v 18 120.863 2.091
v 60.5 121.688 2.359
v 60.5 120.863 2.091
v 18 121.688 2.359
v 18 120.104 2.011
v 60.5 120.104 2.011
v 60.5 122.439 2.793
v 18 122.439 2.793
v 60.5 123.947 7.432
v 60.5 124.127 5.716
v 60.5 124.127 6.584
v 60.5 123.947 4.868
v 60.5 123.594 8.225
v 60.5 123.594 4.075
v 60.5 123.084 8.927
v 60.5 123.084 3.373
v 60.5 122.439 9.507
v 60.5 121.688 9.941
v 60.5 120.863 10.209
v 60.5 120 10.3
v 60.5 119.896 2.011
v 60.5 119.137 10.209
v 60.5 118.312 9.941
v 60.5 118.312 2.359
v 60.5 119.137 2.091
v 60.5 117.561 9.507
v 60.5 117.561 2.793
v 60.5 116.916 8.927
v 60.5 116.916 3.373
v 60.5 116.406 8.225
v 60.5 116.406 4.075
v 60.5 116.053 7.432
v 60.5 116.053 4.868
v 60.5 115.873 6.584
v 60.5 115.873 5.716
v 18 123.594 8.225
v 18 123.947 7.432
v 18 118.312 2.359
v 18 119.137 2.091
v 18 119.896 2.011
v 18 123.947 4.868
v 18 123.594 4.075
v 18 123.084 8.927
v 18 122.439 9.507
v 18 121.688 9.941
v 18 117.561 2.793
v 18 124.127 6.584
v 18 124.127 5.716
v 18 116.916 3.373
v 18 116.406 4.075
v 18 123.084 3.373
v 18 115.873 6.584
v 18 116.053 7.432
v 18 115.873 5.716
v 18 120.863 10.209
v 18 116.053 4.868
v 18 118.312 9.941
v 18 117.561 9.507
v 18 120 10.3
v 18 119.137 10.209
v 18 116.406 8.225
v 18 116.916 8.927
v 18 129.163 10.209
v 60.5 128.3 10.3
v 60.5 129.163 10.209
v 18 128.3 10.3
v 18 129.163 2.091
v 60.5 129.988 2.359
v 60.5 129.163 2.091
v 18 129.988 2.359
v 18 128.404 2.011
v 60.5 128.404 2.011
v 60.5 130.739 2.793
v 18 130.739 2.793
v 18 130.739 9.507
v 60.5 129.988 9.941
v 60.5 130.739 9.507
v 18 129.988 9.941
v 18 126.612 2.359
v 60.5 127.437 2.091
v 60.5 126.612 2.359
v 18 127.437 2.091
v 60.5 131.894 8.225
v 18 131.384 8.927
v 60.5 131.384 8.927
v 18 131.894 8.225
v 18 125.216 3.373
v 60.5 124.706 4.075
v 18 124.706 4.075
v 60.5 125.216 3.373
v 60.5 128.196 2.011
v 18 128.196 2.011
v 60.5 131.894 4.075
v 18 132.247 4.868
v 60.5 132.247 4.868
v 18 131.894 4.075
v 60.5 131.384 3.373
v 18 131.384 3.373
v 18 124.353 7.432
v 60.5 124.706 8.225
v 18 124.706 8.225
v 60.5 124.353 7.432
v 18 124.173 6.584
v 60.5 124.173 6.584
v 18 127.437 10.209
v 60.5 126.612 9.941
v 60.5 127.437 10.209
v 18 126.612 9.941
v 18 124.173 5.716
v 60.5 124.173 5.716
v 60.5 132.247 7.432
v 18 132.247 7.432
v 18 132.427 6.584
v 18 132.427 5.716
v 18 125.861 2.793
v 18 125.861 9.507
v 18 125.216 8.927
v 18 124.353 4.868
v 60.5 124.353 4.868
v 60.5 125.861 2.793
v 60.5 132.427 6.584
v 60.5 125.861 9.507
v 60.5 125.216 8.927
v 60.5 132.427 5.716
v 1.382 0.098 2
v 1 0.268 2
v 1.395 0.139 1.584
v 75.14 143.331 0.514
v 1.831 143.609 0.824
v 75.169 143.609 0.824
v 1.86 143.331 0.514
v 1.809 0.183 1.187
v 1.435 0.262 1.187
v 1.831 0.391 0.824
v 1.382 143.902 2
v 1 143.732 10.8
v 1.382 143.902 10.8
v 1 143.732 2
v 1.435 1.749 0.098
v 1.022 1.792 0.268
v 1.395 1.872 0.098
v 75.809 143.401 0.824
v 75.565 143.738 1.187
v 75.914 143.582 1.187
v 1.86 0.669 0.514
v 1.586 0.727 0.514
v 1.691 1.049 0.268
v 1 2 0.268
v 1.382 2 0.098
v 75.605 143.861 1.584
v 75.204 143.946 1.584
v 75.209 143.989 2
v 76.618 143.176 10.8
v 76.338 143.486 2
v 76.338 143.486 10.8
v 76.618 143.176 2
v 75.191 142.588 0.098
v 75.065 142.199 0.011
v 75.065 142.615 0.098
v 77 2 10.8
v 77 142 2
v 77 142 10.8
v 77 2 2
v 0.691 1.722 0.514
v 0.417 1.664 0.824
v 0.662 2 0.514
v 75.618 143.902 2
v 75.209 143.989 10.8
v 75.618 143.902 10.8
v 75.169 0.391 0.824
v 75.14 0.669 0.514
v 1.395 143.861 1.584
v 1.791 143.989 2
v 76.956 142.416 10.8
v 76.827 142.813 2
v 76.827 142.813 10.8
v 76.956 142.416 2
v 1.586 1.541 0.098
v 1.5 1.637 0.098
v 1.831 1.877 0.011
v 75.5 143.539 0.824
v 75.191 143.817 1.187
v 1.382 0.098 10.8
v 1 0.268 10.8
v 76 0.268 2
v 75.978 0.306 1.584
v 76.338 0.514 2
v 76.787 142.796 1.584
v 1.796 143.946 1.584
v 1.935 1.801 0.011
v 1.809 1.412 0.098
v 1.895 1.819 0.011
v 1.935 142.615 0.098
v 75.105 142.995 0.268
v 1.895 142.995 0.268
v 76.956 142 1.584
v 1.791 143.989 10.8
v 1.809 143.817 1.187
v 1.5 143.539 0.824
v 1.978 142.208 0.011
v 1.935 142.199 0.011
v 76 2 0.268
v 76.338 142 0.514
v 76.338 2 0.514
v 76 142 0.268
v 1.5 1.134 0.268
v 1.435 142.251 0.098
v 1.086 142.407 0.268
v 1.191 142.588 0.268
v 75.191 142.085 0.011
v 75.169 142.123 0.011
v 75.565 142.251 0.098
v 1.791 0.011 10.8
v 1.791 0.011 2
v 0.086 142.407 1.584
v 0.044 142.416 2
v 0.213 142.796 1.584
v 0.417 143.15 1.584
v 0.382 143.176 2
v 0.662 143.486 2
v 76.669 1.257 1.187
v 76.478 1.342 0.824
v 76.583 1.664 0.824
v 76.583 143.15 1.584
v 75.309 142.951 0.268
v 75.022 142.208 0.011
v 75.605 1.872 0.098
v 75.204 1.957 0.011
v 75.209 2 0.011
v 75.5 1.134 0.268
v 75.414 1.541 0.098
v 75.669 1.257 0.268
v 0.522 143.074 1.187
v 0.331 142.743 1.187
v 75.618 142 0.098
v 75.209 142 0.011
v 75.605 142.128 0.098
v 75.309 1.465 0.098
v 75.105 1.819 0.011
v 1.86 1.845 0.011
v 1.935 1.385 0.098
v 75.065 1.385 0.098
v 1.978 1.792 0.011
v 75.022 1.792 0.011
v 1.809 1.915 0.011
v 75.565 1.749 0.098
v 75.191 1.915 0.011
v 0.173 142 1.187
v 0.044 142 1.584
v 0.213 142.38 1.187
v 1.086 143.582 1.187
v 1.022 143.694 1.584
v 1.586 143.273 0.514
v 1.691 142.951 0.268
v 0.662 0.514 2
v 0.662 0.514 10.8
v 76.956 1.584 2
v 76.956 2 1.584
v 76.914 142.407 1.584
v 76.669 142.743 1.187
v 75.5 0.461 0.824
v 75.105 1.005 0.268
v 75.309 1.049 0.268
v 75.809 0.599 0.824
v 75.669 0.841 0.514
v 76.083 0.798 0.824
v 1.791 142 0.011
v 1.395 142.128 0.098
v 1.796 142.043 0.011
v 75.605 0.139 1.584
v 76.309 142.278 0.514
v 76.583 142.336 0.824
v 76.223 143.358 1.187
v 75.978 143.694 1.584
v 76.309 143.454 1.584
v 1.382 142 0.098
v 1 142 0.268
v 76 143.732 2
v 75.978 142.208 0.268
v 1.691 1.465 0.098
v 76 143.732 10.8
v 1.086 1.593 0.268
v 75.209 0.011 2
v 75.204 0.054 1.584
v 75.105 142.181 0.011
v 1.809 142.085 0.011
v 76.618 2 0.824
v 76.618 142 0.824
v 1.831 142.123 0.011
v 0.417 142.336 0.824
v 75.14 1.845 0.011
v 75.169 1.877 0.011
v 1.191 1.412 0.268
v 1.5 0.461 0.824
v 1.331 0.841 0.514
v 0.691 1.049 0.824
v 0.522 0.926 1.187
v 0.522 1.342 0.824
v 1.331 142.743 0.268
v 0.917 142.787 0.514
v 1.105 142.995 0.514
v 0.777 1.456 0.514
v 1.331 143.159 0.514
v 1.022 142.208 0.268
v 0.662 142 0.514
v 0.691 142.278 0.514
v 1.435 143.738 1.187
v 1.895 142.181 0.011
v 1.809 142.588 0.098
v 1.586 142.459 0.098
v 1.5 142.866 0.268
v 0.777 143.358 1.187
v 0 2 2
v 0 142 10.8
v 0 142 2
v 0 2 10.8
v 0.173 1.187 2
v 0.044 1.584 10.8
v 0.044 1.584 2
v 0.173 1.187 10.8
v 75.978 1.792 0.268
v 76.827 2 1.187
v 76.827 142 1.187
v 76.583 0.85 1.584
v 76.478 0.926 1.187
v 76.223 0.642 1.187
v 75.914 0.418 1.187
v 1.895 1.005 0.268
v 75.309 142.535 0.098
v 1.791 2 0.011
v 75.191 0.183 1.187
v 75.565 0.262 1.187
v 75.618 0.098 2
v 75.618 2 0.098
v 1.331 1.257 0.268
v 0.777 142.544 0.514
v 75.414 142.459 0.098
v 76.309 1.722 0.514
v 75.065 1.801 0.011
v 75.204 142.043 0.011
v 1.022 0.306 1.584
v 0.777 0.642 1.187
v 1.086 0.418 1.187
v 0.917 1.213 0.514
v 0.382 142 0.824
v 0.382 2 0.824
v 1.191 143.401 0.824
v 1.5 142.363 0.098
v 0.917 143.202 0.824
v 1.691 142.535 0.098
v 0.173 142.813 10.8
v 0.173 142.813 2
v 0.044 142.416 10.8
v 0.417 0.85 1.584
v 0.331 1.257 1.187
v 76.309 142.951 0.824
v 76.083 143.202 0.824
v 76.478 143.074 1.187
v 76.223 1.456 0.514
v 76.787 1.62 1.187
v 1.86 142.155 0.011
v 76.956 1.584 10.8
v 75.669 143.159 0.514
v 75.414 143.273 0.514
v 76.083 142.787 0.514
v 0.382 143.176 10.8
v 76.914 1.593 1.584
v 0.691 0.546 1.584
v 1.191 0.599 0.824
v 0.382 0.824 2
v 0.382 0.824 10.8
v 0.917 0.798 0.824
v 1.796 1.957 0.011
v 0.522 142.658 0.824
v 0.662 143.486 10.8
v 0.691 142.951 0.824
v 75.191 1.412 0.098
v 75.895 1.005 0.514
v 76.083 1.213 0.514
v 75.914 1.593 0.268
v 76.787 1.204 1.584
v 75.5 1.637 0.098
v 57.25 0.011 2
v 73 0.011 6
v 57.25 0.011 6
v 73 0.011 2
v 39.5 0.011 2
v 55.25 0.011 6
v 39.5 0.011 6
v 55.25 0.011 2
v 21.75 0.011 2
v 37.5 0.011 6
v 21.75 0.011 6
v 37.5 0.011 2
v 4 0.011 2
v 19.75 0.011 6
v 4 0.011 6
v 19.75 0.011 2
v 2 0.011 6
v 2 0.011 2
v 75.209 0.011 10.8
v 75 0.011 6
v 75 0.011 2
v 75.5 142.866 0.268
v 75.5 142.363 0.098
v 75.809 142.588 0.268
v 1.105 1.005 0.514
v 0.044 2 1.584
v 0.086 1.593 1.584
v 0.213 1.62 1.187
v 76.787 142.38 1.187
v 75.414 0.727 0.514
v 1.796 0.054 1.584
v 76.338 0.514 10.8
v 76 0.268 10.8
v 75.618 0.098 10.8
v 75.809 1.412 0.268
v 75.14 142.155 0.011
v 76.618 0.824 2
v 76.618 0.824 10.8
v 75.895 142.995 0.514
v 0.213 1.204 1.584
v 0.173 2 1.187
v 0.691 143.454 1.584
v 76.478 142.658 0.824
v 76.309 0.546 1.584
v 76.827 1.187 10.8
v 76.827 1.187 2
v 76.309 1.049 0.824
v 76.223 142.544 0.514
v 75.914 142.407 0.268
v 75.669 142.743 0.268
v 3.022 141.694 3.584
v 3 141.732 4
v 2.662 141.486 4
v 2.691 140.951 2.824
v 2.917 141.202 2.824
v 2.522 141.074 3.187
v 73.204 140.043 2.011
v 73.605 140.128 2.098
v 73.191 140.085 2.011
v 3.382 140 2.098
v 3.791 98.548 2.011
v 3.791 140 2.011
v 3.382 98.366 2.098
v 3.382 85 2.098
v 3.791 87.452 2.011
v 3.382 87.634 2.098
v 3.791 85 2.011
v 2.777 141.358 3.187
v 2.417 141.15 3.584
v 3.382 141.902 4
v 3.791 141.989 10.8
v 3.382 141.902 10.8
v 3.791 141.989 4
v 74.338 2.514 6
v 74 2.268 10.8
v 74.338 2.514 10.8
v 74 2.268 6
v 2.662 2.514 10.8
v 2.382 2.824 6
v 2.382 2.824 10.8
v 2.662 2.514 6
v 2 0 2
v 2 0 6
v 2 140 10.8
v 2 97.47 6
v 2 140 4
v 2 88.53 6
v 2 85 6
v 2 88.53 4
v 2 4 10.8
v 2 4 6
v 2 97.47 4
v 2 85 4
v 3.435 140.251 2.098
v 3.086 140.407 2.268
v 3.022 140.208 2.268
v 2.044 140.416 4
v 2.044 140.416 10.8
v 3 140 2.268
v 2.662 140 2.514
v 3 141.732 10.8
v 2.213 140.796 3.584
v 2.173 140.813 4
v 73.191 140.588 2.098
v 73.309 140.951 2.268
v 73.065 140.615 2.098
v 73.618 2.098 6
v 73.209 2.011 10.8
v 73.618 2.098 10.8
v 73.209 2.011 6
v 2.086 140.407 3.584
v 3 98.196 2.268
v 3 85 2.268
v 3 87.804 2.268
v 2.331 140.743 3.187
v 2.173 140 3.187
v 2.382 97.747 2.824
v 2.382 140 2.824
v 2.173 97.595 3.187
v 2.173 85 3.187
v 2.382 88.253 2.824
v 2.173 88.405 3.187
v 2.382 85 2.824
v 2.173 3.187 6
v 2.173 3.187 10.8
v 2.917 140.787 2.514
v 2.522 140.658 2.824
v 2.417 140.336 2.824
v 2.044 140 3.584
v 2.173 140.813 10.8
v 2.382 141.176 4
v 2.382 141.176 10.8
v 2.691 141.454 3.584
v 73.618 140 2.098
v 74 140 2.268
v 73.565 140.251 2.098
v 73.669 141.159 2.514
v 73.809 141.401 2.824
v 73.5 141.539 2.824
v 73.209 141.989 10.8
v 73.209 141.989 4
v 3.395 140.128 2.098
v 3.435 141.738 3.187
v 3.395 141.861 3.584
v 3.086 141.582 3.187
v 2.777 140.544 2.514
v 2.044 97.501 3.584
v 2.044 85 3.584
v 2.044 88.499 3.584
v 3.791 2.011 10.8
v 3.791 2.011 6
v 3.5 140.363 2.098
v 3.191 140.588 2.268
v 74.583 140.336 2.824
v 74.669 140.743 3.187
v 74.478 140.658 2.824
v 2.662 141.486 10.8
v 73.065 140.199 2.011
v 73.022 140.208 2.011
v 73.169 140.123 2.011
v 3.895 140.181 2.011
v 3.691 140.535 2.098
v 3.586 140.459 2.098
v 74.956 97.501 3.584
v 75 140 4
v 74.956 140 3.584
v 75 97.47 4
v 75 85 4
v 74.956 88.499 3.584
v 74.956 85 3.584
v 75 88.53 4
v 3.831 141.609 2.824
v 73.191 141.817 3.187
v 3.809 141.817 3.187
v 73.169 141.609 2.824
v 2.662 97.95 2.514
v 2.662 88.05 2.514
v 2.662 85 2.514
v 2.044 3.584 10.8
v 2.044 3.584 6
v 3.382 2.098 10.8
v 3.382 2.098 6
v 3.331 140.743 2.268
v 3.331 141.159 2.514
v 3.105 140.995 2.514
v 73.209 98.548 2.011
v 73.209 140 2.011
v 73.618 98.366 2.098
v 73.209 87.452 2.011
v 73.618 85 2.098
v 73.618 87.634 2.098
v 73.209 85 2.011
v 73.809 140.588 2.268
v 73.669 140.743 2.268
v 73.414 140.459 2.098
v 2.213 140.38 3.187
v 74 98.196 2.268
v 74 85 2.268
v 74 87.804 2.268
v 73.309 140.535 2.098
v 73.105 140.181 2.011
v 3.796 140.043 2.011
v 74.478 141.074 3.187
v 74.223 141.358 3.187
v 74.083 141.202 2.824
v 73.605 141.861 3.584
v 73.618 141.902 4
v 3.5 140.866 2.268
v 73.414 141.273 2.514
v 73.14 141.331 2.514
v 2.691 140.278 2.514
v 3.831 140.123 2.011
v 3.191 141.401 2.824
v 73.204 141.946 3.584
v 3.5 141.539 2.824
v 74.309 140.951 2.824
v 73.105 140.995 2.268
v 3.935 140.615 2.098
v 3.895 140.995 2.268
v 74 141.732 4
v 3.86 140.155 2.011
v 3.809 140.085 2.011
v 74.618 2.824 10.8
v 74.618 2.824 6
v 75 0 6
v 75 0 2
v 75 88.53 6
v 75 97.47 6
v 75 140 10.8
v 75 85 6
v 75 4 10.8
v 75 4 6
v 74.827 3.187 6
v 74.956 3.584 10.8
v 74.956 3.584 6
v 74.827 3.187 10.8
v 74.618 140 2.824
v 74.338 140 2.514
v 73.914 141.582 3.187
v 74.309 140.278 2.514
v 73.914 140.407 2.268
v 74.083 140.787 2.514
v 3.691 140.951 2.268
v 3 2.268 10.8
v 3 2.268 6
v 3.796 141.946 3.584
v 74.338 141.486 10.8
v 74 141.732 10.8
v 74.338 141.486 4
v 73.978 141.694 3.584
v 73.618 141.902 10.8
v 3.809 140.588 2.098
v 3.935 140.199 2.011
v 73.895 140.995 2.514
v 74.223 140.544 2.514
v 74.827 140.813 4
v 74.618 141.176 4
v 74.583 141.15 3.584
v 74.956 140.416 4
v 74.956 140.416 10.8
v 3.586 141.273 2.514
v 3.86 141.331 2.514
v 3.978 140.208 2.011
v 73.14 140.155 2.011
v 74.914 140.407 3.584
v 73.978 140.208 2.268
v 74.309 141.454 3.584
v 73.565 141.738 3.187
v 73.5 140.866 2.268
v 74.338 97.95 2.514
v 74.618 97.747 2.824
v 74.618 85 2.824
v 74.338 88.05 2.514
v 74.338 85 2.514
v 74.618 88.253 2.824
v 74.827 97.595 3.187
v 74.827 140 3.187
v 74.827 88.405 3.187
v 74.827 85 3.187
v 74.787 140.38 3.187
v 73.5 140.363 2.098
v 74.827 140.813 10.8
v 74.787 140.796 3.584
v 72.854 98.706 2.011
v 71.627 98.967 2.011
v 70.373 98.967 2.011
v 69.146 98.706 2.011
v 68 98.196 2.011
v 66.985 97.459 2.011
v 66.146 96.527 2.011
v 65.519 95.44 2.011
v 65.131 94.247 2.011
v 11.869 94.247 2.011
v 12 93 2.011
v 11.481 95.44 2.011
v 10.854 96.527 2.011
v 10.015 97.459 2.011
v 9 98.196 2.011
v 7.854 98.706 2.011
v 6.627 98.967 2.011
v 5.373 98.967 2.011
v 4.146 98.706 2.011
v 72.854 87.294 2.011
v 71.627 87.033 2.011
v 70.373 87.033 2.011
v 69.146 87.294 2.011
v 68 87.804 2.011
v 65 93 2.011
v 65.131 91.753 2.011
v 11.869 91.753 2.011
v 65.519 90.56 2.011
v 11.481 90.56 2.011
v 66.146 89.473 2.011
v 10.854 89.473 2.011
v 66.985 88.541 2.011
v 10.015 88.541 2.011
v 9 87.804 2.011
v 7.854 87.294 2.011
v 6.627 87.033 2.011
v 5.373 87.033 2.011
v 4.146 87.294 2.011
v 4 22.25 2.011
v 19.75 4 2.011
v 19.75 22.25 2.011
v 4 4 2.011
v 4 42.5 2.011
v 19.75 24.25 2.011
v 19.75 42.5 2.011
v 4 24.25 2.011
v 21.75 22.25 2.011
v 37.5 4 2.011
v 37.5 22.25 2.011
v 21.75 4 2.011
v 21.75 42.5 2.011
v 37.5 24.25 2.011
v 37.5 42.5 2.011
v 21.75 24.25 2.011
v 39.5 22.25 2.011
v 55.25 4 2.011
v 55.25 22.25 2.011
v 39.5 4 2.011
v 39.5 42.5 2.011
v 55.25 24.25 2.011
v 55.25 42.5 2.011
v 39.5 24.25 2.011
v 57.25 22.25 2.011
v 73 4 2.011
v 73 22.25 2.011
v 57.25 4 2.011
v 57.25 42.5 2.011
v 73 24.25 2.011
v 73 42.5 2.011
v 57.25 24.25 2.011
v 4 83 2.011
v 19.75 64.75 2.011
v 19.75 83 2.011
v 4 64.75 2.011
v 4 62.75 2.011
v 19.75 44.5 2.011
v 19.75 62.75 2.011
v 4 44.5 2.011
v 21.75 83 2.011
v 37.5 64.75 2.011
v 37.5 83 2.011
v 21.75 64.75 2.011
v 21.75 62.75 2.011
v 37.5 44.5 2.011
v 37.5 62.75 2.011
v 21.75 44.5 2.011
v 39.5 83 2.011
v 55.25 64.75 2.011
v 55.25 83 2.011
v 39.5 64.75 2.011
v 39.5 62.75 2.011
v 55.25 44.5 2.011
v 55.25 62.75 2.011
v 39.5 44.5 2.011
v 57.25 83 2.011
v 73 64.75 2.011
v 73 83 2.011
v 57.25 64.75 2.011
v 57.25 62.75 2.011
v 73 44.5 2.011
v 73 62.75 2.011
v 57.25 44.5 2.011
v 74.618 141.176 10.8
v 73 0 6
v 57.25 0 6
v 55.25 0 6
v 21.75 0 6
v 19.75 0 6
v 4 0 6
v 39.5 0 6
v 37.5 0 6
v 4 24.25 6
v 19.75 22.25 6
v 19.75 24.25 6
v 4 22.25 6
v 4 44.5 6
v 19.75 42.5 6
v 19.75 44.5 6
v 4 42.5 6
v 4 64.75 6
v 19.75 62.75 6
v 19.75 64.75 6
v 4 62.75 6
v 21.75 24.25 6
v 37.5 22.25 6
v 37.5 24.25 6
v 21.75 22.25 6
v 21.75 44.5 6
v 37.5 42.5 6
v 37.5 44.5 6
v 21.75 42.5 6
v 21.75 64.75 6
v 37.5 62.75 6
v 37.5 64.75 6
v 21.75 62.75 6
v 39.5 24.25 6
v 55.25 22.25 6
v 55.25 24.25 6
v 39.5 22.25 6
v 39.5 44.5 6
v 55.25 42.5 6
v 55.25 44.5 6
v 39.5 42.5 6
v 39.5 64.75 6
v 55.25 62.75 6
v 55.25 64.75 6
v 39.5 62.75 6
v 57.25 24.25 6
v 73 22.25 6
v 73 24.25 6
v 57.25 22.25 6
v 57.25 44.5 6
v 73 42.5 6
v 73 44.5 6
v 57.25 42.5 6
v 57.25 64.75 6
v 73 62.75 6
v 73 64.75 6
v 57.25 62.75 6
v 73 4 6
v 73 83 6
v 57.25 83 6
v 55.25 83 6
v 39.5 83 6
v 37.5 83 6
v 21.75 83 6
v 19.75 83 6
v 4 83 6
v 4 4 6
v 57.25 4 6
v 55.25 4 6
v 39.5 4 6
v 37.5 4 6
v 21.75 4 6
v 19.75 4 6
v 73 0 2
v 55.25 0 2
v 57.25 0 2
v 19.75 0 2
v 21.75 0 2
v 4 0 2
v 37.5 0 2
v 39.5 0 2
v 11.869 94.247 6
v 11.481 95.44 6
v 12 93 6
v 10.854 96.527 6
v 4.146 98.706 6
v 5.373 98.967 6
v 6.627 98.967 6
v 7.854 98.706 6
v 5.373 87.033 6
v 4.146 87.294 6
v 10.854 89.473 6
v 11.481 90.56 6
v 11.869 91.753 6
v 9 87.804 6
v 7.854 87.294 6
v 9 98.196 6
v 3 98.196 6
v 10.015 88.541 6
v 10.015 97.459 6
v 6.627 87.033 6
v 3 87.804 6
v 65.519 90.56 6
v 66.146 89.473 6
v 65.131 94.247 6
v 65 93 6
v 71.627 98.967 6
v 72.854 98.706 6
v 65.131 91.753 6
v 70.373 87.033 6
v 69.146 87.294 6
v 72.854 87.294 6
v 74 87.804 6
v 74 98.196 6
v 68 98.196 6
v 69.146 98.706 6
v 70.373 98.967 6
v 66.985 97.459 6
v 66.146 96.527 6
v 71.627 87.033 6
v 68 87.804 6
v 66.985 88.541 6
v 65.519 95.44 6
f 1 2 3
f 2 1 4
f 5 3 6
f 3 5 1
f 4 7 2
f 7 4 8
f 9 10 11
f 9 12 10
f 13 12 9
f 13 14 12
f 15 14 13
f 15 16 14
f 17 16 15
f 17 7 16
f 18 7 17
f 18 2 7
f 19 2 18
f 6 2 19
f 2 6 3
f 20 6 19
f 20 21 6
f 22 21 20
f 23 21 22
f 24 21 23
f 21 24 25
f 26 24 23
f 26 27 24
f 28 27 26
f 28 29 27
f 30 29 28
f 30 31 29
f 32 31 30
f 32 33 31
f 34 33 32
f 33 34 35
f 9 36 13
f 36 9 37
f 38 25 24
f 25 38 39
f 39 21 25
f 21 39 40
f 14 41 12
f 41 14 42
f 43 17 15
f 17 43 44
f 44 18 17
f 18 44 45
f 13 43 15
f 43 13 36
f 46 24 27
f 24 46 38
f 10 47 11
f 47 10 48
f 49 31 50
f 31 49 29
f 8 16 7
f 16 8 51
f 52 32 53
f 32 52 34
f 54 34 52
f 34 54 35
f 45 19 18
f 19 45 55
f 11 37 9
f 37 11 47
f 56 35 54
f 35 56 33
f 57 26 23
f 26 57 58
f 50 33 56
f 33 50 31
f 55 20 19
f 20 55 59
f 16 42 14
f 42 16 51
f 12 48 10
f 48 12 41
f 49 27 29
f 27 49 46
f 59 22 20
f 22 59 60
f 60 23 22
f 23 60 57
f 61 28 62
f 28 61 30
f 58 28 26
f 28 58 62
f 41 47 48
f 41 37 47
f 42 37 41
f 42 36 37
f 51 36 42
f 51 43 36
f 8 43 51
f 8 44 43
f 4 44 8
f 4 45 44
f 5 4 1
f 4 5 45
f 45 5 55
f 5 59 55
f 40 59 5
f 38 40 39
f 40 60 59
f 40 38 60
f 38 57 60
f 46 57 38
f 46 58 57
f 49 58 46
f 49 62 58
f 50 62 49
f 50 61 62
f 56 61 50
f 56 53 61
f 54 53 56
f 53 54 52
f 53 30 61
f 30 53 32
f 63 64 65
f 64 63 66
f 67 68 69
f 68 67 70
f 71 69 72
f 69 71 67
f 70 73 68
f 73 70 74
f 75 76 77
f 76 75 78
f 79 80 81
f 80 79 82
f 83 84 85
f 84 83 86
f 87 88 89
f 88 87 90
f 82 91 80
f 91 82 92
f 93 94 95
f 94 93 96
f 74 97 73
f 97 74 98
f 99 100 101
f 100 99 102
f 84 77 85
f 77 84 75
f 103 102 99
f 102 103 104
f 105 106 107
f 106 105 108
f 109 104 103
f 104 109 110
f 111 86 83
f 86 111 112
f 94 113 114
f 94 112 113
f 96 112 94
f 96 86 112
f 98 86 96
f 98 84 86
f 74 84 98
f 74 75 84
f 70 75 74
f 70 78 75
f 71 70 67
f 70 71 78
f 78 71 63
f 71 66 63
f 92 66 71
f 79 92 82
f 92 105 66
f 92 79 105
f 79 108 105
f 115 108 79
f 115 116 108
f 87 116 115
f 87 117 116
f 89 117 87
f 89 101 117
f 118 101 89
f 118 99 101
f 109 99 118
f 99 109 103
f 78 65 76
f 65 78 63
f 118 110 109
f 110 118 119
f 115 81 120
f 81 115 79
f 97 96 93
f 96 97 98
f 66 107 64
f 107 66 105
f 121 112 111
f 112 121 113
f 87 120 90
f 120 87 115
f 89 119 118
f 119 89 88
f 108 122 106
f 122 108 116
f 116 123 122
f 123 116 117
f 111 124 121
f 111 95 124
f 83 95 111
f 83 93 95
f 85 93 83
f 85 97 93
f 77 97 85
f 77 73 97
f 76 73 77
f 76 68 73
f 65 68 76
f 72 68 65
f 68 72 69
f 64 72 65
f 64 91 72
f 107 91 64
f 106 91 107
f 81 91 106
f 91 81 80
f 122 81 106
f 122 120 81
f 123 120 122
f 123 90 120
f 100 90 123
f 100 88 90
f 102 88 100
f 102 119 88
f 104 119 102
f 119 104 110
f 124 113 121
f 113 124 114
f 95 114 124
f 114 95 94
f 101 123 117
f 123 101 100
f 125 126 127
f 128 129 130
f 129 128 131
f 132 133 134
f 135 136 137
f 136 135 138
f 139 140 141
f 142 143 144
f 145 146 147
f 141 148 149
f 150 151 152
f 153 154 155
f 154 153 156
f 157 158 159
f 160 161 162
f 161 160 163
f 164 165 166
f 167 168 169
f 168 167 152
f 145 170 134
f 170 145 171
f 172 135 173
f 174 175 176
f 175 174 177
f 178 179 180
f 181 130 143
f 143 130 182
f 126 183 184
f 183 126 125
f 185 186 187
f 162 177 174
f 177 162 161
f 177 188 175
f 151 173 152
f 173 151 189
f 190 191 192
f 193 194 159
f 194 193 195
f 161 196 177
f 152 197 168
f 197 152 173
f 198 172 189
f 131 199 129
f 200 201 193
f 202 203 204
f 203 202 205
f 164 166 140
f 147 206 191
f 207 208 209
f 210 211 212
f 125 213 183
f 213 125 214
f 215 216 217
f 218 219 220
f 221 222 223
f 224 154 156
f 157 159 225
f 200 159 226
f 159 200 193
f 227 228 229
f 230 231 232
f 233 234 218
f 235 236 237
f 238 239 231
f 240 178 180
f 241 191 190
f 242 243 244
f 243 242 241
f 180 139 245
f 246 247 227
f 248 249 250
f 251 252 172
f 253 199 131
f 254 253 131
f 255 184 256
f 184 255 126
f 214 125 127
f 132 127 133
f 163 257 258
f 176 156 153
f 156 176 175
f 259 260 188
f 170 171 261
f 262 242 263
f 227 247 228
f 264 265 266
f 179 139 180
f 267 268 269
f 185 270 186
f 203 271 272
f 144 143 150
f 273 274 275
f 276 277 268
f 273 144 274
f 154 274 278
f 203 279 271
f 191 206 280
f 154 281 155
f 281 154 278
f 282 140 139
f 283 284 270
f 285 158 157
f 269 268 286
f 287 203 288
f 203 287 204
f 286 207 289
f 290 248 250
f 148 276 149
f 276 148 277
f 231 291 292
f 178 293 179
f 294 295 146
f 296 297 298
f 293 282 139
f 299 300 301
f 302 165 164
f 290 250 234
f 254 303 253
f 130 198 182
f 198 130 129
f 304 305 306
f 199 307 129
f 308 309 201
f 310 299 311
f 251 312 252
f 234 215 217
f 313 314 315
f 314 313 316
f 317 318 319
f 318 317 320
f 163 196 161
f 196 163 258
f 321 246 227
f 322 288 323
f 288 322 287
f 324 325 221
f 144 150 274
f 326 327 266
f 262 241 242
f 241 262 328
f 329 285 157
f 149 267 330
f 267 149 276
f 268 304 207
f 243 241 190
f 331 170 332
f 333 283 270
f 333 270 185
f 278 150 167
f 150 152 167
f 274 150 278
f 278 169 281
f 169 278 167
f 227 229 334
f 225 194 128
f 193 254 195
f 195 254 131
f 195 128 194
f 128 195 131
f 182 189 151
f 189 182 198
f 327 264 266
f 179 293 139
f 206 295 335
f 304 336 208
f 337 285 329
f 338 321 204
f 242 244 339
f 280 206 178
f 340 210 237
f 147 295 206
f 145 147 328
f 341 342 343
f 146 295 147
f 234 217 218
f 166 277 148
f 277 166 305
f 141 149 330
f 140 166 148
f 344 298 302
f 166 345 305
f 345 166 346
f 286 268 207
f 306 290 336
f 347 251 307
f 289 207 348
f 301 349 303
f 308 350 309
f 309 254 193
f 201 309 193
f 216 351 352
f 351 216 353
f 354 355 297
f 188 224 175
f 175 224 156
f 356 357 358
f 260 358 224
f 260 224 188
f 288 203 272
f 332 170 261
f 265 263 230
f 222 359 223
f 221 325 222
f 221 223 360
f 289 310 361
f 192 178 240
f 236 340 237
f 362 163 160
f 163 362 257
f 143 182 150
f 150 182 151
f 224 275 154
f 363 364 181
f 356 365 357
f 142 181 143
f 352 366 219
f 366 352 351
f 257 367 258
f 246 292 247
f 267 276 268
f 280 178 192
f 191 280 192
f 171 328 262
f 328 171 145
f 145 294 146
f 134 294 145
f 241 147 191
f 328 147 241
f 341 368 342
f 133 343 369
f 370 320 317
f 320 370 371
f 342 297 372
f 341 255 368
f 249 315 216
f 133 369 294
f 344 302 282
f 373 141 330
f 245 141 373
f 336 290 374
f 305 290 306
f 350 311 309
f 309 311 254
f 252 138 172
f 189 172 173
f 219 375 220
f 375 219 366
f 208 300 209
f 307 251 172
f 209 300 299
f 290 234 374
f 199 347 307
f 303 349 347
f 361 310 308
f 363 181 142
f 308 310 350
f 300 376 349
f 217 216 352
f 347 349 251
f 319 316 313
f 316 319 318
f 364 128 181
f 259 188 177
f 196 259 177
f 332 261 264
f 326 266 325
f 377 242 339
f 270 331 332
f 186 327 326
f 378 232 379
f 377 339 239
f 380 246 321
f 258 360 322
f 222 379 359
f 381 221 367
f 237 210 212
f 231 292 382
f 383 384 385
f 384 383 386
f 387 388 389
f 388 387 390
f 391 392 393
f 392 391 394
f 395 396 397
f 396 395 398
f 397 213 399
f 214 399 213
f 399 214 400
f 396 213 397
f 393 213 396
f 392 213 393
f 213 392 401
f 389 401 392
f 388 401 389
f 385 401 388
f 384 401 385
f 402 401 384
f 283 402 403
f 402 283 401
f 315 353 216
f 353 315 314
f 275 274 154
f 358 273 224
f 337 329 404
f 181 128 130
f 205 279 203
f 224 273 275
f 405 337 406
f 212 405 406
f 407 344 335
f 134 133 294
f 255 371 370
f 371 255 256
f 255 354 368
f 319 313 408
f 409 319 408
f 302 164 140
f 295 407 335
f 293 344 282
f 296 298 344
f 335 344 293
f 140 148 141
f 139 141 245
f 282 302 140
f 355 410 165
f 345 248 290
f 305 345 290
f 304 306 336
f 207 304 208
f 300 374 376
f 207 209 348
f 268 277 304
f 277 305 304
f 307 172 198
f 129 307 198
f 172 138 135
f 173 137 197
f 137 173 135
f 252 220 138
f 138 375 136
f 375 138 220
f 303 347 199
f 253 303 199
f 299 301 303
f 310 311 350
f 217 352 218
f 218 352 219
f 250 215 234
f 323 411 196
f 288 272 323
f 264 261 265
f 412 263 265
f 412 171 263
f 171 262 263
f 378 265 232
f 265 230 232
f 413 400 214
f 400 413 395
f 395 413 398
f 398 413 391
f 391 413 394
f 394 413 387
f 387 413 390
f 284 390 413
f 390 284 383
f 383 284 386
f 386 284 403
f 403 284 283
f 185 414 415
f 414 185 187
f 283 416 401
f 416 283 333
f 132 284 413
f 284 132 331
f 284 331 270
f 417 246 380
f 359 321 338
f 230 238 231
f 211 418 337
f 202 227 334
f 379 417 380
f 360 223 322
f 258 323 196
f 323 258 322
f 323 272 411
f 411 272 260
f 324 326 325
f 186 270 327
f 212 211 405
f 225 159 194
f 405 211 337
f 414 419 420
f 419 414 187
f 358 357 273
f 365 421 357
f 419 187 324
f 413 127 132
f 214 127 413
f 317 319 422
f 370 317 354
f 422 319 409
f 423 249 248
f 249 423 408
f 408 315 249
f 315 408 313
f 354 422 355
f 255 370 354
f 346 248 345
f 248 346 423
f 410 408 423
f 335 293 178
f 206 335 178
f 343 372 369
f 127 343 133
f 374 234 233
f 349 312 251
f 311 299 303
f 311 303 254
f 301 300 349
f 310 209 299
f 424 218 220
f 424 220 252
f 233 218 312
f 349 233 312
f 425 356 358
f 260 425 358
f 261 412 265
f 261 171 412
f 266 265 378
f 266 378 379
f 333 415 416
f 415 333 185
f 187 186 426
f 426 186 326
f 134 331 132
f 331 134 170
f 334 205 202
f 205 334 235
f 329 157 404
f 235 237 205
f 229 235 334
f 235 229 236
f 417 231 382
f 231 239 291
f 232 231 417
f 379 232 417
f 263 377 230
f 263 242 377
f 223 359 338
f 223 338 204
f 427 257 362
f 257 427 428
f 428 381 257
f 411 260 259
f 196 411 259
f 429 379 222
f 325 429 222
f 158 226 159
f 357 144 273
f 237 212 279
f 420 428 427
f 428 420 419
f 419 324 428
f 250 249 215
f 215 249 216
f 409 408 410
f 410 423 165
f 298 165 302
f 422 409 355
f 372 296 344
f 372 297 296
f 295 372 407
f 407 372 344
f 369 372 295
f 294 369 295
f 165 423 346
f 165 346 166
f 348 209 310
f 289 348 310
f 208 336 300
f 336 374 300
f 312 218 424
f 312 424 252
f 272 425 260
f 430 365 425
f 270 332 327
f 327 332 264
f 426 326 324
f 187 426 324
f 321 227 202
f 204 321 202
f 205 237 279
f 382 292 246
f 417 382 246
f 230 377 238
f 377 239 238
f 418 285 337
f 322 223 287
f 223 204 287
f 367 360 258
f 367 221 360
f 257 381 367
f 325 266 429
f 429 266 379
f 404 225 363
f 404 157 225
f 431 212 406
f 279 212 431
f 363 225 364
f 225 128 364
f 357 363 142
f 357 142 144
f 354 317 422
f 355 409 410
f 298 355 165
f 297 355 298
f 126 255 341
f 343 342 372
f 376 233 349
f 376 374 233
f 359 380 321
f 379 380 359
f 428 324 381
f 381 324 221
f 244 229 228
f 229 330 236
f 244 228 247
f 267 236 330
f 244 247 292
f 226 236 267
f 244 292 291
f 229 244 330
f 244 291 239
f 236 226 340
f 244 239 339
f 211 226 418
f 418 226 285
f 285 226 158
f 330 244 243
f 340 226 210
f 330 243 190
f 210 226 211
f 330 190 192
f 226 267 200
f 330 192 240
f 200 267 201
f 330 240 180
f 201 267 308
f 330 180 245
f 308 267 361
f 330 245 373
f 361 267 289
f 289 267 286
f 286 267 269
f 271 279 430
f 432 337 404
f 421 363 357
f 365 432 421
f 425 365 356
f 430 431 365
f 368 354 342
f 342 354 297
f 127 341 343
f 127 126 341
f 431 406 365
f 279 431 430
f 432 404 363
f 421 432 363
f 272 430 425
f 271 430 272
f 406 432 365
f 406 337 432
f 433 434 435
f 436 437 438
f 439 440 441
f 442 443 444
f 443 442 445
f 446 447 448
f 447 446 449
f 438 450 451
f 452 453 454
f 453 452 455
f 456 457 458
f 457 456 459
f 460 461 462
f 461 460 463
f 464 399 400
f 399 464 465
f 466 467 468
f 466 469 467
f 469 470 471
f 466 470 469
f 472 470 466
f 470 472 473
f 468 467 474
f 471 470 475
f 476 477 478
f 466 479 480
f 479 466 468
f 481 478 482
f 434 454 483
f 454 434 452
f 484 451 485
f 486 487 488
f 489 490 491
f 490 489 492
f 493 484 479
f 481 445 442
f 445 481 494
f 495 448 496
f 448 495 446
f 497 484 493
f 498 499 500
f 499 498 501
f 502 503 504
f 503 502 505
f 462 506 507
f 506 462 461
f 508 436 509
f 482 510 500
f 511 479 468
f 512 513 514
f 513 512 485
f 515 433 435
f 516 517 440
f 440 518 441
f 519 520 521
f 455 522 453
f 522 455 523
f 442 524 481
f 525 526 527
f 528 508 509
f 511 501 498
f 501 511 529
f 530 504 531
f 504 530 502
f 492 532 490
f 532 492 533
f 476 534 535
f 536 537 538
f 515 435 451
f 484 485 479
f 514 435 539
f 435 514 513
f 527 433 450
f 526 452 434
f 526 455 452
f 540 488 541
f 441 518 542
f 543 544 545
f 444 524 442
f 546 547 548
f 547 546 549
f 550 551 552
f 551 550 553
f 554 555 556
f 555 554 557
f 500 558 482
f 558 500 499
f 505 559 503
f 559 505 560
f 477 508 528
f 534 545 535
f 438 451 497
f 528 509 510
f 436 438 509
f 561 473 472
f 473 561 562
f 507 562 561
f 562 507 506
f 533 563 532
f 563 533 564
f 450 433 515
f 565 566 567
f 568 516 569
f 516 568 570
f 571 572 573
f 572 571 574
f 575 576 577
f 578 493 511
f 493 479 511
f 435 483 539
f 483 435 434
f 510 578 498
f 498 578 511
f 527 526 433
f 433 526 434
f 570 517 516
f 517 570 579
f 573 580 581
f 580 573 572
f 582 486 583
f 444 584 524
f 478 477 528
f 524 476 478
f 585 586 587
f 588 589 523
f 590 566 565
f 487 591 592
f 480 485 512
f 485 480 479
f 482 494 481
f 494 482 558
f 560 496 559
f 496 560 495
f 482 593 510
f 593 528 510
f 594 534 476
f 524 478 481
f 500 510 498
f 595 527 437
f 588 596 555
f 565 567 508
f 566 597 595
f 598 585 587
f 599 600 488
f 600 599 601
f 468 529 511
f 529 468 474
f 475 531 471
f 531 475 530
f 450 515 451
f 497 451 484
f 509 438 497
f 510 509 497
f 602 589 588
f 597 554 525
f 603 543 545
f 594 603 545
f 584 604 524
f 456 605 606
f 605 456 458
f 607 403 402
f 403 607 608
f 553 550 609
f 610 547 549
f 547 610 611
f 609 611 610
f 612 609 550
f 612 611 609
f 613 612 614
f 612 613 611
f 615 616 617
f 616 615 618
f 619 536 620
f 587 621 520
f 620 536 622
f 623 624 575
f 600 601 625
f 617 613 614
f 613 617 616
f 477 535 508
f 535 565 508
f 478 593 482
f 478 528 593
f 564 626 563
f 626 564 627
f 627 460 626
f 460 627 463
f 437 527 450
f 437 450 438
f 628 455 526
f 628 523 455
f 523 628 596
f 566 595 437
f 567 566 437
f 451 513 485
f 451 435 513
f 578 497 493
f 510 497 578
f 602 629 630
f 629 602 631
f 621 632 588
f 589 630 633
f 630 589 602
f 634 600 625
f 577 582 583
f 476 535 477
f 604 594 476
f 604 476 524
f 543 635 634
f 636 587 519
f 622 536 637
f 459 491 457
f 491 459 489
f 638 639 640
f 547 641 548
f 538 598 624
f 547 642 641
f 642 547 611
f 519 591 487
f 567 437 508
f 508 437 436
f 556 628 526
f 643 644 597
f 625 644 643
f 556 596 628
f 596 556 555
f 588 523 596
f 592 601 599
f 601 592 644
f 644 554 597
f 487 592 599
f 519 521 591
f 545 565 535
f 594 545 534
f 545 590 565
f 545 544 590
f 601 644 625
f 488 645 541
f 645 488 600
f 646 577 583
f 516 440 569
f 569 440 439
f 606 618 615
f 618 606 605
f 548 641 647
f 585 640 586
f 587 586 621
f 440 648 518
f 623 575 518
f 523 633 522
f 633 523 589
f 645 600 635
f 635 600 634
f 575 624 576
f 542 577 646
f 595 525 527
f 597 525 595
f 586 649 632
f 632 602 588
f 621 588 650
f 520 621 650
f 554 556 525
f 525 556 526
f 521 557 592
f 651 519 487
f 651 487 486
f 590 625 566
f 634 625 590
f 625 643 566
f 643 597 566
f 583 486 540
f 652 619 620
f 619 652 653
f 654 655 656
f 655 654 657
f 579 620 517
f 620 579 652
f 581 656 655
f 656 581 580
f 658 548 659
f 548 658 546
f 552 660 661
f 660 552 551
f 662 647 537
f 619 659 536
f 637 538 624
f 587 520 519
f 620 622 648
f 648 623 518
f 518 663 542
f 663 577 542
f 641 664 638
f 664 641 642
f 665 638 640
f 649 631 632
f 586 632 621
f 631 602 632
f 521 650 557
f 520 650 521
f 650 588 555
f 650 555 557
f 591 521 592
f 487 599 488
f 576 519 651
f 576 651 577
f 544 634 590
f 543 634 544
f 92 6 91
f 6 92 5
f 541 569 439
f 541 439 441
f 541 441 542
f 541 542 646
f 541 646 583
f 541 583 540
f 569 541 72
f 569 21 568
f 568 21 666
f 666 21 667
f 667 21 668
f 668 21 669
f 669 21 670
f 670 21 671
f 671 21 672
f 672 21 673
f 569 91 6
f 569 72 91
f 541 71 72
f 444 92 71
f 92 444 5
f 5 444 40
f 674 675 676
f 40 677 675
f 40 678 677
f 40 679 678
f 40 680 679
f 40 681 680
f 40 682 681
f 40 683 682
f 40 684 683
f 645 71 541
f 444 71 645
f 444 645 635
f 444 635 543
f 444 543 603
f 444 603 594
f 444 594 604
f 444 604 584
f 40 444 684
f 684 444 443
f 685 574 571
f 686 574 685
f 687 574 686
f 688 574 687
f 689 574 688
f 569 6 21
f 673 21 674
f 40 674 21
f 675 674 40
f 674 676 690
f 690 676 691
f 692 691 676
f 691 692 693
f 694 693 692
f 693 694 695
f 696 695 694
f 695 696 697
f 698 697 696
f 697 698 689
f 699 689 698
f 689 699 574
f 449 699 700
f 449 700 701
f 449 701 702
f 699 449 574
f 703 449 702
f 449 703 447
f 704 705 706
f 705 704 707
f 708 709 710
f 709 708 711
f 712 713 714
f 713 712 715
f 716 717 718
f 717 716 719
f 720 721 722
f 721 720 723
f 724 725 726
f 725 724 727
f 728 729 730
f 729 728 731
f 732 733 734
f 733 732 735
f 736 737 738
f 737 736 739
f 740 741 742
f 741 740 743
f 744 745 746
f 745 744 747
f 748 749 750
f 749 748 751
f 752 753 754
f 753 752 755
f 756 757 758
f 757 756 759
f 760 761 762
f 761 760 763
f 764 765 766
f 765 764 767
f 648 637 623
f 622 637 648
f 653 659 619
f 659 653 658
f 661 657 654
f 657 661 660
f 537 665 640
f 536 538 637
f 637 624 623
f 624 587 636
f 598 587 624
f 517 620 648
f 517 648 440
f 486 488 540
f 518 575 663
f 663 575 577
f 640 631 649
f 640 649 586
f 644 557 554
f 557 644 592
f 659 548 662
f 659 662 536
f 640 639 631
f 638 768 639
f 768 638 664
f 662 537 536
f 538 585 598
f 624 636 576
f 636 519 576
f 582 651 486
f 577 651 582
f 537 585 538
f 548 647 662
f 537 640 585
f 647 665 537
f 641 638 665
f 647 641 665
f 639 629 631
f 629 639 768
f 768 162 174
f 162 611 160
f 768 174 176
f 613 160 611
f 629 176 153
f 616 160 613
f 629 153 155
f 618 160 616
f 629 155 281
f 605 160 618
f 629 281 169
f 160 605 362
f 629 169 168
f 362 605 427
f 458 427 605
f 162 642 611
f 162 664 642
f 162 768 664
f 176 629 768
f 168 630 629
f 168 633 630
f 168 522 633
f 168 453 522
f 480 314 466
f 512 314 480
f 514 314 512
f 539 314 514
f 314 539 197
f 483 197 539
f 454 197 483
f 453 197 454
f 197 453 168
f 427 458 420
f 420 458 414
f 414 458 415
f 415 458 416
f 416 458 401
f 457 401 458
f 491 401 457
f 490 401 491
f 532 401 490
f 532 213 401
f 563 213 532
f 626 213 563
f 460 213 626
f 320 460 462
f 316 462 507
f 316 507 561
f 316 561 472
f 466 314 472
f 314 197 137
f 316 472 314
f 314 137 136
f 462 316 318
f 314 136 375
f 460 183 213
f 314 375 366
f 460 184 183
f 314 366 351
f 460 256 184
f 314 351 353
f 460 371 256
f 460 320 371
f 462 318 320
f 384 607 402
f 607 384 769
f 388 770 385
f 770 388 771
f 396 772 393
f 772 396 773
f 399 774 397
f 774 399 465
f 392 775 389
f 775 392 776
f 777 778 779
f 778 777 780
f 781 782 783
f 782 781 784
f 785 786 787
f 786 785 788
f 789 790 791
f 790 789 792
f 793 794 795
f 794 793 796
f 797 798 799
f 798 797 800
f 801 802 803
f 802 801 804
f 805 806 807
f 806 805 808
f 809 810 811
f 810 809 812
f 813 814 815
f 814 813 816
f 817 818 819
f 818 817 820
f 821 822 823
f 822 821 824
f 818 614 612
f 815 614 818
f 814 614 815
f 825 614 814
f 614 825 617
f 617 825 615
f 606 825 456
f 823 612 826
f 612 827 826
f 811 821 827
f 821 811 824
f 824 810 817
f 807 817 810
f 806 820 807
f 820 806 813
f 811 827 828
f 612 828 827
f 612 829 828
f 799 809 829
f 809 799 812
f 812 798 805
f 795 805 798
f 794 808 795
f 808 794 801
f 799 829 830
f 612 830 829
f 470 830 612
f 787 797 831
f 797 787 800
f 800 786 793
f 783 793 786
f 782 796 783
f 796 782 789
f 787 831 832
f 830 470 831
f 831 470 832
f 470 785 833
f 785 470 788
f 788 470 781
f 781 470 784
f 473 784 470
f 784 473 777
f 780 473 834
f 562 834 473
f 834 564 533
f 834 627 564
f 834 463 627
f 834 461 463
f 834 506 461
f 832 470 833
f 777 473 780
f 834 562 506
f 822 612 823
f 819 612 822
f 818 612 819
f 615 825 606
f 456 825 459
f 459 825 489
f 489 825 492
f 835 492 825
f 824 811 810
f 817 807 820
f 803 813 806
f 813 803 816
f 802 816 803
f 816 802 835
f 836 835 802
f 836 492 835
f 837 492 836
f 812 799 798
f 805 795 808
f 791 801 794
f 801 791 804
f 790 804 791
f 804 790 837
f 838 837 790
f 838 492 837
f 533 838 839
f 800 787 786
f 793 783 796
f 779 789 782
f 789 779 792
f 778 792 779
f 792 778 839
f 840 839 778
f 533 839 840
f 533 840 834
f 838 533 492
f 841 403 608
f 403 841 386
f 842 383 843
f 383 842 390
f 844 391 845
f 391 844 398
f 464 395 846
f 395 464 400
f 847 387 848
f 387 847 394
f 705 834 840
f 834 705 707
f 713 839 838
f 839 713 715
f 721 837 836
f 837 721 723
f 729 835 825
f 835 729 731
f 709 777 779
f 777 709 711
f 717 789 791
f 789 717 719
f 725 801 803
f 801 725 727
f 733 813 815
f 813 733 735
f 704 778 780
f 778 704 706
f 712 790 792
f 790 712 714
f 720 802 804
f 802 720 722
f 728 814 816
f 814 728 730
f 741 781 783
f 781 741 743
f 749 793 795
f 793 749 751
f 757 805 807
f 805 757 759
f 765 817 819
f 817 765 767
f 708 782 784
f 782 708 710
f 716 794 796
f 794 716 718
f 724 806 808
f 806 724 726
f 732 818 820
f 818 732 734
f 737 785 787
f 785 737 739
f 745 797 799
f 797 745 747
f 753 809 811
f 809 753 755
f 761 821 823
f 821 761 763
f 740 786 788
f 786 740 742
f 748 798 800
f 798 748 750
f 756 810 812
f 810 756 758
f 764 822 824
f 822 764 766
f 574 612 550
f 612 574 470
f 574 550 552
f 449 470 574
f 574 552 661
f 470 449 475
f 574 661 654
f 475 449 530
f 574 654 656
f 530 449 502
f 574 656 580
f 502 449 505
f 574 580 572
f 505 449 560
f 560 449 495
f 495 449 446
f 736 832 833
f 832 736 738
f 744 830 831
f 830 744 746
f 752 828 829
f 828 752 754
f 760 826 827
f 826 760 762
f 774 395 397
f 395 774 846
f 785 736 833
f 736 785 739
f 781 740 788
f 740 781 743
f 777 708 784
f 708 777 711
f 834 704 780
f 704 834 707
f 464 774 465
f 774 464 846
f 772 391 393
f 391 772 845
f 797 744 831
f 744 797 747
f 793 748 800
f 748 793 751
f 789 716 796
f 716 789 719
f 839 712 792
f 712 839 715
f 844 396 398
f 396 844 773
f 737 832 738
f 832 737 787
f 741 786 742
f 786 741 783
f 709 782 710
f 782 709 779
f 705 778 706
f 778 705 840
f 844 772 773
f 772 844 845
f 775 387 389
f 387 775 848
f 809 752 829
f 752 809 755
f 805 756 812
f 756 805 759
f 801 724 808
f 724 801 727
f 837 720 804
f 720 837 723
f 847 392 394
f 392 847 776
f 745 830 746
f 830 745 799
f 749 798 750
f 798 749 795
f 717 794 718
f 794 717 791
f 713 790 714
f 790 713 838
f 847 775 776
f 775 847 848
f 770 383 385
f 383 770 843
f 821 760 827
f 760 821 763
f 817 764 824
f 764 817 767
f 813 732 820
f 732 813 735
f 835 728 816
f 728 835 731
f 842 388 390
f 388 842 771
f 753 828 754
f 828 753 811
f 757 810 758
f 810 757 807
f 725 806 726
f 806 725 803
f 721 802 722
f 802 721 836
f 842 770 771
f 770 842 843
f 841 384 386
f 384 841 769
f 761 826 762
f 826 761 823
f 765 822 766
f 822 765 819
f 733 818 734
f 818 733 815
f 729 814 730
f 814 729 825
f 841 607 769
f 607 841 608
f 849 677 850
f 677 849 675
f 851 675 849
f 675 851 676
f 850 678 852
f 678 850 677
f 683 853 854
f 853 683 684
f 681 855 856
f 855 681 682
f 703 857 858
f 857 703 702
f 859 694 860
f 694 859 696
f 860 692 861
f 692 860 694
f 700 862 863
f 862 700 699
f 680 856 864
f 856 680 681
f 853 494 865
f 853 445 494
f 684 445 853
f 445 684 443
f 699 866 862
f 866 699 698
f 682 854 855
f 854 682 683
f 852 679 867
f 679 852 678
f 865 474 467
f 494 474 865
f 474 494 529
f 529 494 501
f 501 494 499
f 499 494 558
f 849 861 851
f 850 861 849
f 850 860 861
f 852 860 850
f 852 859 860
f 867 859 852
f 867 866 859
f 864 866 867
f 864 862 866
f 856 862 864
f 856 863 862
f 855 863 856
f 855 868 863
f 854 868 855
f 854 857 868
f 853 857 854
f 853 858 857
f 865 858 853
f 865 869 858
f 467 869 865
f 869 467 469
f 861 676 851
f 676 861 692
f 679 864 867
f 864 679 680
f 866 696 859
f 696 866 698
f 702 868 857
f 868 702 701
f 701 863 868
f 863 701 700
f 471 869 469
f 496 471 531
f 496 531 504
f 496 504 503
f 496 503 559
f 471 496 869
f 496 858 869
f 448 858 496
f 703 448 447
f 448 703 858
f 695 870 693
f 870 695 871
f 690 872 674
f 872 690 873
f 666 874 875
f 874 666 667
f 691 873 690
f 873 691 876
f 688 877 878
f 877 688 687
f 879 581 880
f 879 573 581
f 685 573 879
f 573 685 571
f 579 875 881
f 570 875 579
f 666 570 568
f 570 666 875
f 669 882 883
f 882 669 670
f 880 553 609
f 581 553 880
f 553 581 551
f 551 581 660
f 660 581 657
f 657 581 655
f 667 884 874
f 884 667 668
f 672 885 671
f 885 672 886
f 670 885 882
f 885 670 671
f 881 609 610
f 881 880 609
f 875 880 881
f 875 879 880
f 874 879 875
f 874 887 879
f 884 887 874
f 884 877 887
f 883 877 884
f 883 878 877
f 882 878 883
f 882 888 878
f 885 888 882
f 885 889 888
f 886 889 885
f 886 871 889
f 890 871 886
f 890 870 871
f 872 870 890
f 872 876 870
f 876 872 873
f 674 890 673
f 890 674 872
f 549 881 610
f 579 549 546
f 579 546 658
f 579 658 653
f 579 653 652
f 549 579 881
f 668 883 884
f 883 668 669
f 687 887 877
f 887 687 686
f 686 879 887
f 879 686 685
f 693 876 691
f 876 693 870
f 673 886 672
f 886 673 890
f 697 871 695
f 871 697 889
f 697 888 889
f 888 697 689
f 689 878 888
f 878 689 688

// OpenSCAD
/*
    DM50 - Javier Báscones Velázquez - 2024
*/

$fn=30;
// Battery
// AA  : 50 x 14.2
// AAA : 44.5x10.5
// AAAA: 42.5x8.3
bat_h = 42.5;
bat_d = 8.3;

// PCB -----------------------
pcb_height = 138;
pcb_thickness = 2;
pcb_width = 71;
// CASE -----------------------
// thickness
r = 2; // case chamfers
t = 2;
// width
w = 77;
// height
h = 144;
// depth
d = 12;
// height bottom
bottom_height = 8.3+0.5+t; // d aaa = 10.5mm (12 max)
bottom_sup_height = 4;
bottom_sup_ymin = t;
bottom_sup_ymax = 85;
bottom_sup_xmin = t;
bottom_sup_xmax = w-t;

bottom_ysupports = 5;
bottom_xsupports = 5;

screw_h = 95;
screw_r = 6;

// pcb supports
pcb_hight = 5;
sup_hight = 4;
keypad_radio_sup = 1;

// AAA
color( "gray", 1.0 )
translate([18,120,bat_d/2+t])
rotate([0,90,0])
union(){
cylinder(d=bat_d,h=bat_h);
translate([0,bat_d,0])
cylinder(d=bat_d,h=bat_h);
}

//cube(size = [w, t, bottom_height]);

difference()
{
    difference()
    {
        translate([r, r, r])
        minkowski()
        {
          cube([w-r*2,h-r*2,bottom_height]);
          //cylinder(r=2,h=1);
          sphere(r=r);
        }
        
        translate([r*2, r*2, r+t])
        minkowski()
        {
          cube([w-r*4,h-r*4,bottom_height+10]);
          sphere(r=r);
          //cylinder(r=2,h=1);
        }    
    }
    translate([-r, -r, bottom_height])
    cube(size = [w+r*2, h+r*2, bottom_height]);
}

// support
for ( i = [0 : bottom_ysupports-1] ){
    translate([0, bottom_sup_ymin+i*(bottom_sup_ymax-bottom_sup_ymin-t)/(bottom_ysupports-1), t])
    cube(size = [w, t, bottom_sup_height]);
}

for ( i = [0 : bottom_xsupports-1] ){
    translate([bottom_sup_xmin+i*(bottom_sup_xmax-bottom_sup_xmin-t)/(bottom_xsupports-1), 0, t])
    cube(size = [t, bottom_sup_ymax, bottom_sup_height]);
}

// screws
translate([6, screw_h-t, t])
cylinder(h=bottom_sup_height, r=screw_r, center=false);
translate([w-6, screw_h-t, t])
cylinder(h=bottom_sup_height, r=screw_r, center=false);

//color( "DarkGreen", 1.0 )
//translate([0,0,pcb_hight+t])
//cube(size = [pcb_width,pcb_height,pcb_thickness]);

//cylinder(h=20, r=keypad_radio_sup, center=true);
